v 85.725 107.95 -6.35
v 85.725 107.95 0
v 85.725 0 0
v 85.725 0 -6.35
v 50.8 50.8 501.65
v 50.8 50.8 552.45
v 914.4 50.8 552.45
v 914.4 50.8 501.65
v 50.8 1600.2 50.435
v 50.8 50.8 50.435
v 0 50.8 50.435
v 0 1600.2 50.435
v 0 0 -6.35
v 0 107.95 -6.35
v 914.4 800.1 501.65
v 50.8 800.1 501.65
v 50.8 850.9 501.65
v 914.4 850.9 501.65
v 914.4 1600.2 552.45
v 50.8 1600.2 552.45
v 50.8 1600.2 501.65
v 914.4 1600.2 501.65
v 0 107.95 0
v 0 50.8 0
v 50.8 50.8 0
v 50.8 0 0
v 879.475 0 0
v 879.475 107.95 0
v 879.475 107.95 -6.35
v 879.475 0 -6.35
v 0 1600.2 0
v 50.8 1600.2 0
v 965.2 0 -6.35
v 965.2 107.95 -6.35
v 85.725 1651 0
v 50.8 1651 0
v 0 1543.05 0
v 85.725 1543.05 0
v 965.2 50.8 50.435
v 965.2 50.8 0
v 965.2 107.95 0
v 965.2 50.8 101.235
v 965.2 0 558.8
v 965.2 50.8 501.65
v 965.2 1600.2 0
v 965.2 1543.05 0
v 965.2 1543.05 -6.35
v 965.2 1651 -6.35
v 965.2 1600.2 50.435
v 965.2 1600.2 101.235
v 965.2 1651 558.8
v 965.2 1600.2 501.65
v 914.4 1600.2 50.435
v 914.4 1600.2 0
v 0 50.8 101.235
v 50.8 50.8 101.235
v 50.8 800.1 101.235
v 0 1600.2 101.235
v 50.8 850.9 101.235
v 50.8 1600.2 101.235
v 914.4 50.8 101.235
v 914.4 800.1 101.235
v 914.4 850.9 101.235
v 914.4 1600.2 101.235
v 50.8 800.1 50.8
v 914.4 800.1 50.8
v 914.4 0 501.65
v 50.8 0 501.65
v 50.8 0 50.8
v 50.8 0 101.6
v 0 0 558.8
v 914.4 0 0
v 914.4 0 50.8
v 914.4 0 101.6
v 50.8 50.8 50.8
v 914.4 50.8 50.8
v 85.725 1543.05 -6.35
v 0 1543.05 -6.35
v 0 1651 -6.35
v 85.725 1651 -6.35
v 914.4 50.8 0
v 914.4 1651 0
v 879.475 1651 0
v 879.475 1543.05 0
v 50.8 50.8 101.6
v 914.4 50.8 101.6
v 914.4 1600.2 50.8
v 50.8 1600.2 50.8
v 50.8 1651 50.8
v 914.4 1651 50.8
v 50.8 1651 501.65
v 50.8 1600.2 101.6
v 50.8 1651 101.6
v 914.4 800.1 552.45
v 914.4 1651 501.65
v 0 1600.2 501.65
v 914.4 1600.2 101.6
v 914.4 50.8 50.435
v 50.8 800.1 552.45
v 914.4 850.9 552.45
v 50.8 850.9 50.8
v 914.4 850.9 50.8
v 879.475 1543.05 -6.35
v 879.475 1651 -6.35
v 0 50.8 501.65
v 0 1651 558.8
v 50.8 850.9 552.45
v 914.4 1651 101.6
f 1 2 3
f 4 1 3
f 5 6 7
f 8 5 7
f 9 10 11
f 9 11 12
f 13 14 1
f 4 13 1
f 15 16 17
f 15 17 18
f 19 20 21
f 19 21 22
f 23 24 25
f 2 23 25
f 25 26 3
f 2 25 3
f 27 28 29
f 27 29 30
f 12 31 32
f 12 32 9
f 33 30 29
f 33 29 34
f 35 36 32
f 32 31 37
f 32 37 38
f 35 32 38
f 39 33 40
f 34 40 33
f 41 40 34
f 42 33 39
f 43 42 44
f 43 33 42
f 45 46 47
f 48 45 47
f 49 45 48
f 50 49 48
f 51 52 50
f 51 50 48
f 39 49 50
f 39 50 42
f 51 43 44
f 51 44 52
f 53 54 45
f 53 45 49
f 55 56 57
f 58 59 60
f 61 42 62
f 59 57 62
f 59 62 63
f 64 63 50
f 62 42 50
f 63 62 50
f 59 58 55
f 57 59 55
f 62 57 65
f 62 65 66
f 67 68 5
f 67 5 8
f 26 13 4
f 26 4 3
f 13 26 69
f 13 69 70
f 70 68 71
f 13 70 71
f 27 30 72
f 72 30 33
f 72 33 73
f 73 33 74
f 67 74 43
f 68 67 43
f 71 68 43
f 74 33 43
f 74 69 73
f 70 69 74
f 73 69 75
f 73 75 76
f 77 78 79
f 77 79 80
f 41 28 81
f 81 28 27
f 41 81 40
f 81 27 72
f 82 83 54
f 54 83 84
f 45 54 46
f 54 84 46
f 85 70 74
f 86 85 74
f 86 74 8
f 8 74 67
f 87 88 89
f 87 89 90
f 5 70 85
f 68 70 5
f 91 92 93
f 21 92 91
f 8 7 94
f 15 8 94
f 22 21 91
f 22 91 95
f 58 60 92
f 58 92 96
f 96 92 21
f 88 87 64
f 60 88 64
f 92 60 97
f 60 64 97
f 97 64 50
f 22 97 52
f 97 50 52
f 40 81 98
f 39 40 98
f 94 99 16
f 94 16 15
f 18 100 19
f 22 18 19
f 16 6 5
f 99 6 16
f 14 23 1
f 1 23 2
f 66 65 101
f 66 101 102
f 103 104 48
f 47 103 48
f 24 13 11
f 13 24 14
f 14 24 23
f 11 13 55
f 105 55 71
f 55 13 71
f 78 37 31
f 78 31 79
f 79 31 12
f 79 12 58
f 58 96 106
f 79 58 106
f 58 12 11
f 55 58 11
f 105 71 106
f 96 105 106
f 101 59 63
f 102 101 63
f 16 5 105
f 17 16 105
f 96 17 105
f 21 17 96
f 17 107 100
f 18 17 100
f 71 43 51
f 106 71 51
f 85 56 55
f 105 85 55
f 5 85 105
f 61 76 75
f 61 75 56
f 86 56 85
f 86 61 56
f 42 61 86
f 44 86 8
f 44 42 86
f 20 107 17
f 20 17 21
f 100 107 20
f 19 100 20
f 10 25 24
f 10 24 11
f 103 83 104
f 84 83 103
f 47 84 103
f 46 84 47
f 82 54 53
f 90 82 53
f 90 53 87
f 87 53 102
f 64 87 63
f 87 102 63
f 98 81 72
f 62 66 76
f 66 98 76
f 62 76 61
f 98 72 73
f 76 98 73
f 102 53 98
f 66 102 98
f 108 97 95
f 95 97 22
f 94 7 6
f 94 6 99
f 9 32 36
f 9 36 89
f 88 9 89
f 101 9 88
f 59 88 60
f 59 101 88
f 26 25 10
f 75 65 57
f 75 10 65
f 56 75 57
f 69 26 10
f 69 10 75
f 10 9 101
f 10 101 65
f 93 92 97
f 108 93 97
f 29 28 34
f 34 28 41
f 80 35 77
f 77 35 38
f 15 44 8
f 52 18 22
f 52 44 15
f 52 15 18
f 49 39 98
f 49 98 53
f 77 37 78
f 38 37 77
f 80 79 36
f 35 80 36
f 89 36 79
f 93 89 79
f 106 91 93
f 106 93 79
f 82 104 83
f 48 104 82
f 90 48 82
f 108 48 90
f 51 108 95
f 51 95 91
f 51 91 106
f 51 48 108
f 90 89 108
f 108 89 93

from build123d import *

# Parameters (mm, degrees)
F0_W      = 965.2
F0_H      = 552.45
F1_DEPTH  = 1651
F2_W      = 863.6
F2_H      = 50.8
F2_H_2    = 400.05
F3_DEPTH  = 1651
F4_W      = 1549.4
F4_H      = 50.434645
F4_H_2    = 400.415355
F5_DEPTH  = 965.2
F6_W      = 863.6
F6_H      = 749.3
F7_DEPTH  = 508
F8_W      = 85.725
F8_H      = 107.95
F9_DEPTH  = 6.35
F10_W     = 1651
F10_H     = 6.35
F11_DEPTH = 965.2


with BuildPart() as f1:
    # F0 (on Front) → F1 (new body)
    with BuildSketch(Plane.XZ):
        with Locations((482.6, 276.225)):
            Rectangle(F0_W, F0_H)
    extrude(amount=-F1_DEPTH)

    # F2 (on face) → F3 (cut, through all)
    with BuildSketch(Plane.XZ):
        with Locations((482.6, 25.4)):
            Rectangle(F2_W, F2_H)
        with Locations((482.6, 301.625)):
            Rectangle(F2_W, F2_H_2)
    extrude(amount=-F3_DEPTH, mode=Mode.SUBTRACT)

    # F4 (on face) → F5 (cut, through all)
    with BuildSketch(Plane.YZ.offset(965.2)):
        with Locations((825.5, 25.217322)):
            Rectangle(F4_W, F4_H)
        with Locations((825.5, 301.442322)):
            Rectangle(F4_W, F4_H_2)
    extrude(amount=-F5_DEPTH, mode=Mode.SUBTRACT)

    # F6 (on face) → F7 (cut)
    with BuildSketch(Plane.XY.offset(552.45)):
        with Locations((482.6, 425.45)):
            Rectangle(F6_W, F6_H)
        with Locations((482.6, 1225.55)):
            Rectangle(F6_W, F6_H)
    extrude(amount=-F7_DEPTH, mode=Mode.SUBTRACT)

    # F8 (on face) → F9 (join)
    with BuildSketch(Plane(origin=(0, 0, 0), x_dir=(1, 0, 0), z_dir=(0, 0, -1))):
        with Locations((922.3375, -1597.025)):
            Rectangle(F8_W, F8_H)
        with Locations((42.8625, -1597.025)):
            Rectangle(F8_W, F8_H)
        with Locations((922.3375, -53.975)):
            Rectangle(F8_W, F8_H)
        with Locations((42.8625, -53.975)):
            Rectangle(F8_W, F8_H)
    extrude(amount=F9_DEPTH)

    # F10 (on face) → F11 (join)
    with BuildSketch(Plane.YZ.offset(965.2)):
        with Locations((825.5, 555.625)):
            Rectangle(F10_W, F10_H)
    extrude(amount=-F11_DEPTH)


solid = f1.part
